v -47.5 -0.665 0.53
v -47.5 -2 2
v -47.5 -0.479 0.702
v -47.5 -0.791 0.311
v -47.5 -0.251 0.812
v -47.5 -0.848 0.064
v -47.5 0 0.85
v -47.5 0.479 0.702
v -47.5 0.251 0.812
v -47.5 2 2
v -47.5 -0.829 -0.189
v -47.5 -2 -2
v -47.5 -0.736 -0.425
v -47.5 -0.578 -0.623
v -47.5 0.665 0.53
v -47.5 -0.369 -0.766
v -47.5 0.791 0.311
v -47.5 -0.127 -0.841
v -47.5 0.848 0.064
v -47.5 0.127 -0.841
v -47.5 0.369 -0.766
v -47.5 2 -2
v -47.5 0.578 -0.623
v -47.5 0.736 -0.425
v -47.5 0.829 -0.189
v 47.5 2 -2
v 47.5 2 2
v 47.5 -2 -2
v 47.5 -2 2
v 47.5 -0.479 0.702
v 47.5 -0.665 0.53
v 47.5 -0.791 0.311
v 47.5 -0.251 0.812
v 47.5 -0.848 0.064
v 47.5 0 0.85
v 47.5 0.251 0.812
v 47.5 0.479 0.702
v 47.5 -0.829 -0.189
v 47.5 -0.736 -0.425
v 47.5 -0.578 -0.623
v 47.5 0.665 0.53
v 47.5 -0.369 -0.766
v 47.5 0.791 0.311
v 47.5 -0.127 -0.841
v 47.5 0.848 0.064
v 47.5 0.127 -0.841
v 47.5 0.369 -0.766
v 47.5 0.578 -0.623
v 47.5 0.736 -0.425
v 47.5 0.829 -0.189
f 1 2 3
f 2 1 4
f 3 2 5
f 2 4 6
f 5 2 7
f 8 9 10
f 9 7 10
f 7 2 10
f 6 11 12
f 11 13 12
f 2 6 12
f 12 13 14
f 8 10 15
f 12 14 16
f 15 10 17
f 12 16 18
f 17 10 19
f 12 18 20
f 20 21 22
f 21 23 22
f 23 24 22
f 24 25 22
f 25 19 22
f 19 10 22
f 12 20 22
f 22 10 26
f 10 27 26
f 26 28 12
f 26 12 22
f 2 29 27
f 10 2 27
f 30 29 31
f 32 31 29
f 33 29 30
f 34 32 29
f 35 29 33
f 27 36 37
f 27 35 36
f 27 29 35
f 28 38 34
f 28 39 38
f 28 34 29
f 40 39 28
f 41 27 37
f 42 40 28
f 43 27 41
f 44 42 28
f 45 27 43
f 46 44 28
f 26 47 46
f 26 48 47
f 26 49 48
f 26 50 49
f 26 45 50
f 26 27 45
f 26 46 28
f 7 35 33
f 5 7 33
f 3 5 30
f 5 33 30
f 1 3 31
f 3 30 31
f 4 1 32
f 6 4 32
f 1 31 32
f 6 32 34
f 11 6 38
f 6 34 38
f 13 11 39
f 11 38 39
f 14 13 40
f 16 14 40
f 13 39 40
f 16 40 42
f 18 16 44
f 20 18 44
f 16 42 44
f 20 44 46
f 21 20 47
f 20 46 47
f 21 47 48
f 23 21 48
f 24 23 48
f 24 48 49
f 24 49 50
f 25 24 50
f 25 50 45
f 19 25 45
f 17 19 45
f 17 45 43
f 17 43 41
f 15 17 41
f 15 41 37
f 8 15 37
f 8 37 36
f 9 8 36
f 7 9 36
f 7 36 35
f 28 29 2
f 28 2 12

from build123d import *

# Parameters (mm, degrees)
ESBO_O1_W                         = 4
ESBO_O1_H                         = 4
RESSALTO_EXTRUS_O1_DEPTH          = 47.5
CORTE_EXTRUS_O1_REACH             = 97.042
ESBO_O2_R                         = 0.85
CORTE_EXTRUS_O1_DIRECTION_2_DEPTH = 96.042095936


with BuildPart() as part:
    # Esboço1 → Ressalto-extrusão1 (new, symmetric)
    with BuildSketch(Plane(origin=(0, 0, 0), x_dir=(0, 0, -1), z_dir=(1, 0, 0))):
        Rectangle(ESBO_O1_W, ESBO_O1_H)
    extrude(amount=RESSALTO_EXTRUS_O1_DEPTH, both=True)

    # Esboço2 → Corte-extrusão1 (cut, up to next)
    with BuildSketch(Plane(origin=(47.5, 0, 0), x_dir=(0, 0, -1), z_dir=(1, 0, 0)), mode=Mode.PRIVATE) as corte_extrus_o1_sk1:
        with Locations(Location((0, 0, 0), (0, 0, 180))):
            Circle(ESBO_O2_R)
    corte_extrus_o1_tool1 = extrude(corte_extrus_o1_sk1.sketch, amount=-CORTE_EXTRUS_O1_REACH, mode=Mode.PRIVATE) & part.part
    add(corte_extrus_o1_tool1.solids().sort_by_distance((47.5, 0, 0))[0], mode=Mode.SUBTRACT)

    # Esboço2 → Corte-extrusão1 direction 2 (cut)
    with BuildSketch(Plane(origin=(47.5, 0, 0), x_dir=(0, 0, -1), z_dir=(1, 0, 0))):
        with Locations(Location((0, 0, 0), (0, 0, 180))):
            Circle(ESBO_O2_R)
    extrude(amount=CORTE_EXTRUS_O1_DIRECTION_2_DEPTH, mode=Mode.SUBTRACT)


solid = part.part
